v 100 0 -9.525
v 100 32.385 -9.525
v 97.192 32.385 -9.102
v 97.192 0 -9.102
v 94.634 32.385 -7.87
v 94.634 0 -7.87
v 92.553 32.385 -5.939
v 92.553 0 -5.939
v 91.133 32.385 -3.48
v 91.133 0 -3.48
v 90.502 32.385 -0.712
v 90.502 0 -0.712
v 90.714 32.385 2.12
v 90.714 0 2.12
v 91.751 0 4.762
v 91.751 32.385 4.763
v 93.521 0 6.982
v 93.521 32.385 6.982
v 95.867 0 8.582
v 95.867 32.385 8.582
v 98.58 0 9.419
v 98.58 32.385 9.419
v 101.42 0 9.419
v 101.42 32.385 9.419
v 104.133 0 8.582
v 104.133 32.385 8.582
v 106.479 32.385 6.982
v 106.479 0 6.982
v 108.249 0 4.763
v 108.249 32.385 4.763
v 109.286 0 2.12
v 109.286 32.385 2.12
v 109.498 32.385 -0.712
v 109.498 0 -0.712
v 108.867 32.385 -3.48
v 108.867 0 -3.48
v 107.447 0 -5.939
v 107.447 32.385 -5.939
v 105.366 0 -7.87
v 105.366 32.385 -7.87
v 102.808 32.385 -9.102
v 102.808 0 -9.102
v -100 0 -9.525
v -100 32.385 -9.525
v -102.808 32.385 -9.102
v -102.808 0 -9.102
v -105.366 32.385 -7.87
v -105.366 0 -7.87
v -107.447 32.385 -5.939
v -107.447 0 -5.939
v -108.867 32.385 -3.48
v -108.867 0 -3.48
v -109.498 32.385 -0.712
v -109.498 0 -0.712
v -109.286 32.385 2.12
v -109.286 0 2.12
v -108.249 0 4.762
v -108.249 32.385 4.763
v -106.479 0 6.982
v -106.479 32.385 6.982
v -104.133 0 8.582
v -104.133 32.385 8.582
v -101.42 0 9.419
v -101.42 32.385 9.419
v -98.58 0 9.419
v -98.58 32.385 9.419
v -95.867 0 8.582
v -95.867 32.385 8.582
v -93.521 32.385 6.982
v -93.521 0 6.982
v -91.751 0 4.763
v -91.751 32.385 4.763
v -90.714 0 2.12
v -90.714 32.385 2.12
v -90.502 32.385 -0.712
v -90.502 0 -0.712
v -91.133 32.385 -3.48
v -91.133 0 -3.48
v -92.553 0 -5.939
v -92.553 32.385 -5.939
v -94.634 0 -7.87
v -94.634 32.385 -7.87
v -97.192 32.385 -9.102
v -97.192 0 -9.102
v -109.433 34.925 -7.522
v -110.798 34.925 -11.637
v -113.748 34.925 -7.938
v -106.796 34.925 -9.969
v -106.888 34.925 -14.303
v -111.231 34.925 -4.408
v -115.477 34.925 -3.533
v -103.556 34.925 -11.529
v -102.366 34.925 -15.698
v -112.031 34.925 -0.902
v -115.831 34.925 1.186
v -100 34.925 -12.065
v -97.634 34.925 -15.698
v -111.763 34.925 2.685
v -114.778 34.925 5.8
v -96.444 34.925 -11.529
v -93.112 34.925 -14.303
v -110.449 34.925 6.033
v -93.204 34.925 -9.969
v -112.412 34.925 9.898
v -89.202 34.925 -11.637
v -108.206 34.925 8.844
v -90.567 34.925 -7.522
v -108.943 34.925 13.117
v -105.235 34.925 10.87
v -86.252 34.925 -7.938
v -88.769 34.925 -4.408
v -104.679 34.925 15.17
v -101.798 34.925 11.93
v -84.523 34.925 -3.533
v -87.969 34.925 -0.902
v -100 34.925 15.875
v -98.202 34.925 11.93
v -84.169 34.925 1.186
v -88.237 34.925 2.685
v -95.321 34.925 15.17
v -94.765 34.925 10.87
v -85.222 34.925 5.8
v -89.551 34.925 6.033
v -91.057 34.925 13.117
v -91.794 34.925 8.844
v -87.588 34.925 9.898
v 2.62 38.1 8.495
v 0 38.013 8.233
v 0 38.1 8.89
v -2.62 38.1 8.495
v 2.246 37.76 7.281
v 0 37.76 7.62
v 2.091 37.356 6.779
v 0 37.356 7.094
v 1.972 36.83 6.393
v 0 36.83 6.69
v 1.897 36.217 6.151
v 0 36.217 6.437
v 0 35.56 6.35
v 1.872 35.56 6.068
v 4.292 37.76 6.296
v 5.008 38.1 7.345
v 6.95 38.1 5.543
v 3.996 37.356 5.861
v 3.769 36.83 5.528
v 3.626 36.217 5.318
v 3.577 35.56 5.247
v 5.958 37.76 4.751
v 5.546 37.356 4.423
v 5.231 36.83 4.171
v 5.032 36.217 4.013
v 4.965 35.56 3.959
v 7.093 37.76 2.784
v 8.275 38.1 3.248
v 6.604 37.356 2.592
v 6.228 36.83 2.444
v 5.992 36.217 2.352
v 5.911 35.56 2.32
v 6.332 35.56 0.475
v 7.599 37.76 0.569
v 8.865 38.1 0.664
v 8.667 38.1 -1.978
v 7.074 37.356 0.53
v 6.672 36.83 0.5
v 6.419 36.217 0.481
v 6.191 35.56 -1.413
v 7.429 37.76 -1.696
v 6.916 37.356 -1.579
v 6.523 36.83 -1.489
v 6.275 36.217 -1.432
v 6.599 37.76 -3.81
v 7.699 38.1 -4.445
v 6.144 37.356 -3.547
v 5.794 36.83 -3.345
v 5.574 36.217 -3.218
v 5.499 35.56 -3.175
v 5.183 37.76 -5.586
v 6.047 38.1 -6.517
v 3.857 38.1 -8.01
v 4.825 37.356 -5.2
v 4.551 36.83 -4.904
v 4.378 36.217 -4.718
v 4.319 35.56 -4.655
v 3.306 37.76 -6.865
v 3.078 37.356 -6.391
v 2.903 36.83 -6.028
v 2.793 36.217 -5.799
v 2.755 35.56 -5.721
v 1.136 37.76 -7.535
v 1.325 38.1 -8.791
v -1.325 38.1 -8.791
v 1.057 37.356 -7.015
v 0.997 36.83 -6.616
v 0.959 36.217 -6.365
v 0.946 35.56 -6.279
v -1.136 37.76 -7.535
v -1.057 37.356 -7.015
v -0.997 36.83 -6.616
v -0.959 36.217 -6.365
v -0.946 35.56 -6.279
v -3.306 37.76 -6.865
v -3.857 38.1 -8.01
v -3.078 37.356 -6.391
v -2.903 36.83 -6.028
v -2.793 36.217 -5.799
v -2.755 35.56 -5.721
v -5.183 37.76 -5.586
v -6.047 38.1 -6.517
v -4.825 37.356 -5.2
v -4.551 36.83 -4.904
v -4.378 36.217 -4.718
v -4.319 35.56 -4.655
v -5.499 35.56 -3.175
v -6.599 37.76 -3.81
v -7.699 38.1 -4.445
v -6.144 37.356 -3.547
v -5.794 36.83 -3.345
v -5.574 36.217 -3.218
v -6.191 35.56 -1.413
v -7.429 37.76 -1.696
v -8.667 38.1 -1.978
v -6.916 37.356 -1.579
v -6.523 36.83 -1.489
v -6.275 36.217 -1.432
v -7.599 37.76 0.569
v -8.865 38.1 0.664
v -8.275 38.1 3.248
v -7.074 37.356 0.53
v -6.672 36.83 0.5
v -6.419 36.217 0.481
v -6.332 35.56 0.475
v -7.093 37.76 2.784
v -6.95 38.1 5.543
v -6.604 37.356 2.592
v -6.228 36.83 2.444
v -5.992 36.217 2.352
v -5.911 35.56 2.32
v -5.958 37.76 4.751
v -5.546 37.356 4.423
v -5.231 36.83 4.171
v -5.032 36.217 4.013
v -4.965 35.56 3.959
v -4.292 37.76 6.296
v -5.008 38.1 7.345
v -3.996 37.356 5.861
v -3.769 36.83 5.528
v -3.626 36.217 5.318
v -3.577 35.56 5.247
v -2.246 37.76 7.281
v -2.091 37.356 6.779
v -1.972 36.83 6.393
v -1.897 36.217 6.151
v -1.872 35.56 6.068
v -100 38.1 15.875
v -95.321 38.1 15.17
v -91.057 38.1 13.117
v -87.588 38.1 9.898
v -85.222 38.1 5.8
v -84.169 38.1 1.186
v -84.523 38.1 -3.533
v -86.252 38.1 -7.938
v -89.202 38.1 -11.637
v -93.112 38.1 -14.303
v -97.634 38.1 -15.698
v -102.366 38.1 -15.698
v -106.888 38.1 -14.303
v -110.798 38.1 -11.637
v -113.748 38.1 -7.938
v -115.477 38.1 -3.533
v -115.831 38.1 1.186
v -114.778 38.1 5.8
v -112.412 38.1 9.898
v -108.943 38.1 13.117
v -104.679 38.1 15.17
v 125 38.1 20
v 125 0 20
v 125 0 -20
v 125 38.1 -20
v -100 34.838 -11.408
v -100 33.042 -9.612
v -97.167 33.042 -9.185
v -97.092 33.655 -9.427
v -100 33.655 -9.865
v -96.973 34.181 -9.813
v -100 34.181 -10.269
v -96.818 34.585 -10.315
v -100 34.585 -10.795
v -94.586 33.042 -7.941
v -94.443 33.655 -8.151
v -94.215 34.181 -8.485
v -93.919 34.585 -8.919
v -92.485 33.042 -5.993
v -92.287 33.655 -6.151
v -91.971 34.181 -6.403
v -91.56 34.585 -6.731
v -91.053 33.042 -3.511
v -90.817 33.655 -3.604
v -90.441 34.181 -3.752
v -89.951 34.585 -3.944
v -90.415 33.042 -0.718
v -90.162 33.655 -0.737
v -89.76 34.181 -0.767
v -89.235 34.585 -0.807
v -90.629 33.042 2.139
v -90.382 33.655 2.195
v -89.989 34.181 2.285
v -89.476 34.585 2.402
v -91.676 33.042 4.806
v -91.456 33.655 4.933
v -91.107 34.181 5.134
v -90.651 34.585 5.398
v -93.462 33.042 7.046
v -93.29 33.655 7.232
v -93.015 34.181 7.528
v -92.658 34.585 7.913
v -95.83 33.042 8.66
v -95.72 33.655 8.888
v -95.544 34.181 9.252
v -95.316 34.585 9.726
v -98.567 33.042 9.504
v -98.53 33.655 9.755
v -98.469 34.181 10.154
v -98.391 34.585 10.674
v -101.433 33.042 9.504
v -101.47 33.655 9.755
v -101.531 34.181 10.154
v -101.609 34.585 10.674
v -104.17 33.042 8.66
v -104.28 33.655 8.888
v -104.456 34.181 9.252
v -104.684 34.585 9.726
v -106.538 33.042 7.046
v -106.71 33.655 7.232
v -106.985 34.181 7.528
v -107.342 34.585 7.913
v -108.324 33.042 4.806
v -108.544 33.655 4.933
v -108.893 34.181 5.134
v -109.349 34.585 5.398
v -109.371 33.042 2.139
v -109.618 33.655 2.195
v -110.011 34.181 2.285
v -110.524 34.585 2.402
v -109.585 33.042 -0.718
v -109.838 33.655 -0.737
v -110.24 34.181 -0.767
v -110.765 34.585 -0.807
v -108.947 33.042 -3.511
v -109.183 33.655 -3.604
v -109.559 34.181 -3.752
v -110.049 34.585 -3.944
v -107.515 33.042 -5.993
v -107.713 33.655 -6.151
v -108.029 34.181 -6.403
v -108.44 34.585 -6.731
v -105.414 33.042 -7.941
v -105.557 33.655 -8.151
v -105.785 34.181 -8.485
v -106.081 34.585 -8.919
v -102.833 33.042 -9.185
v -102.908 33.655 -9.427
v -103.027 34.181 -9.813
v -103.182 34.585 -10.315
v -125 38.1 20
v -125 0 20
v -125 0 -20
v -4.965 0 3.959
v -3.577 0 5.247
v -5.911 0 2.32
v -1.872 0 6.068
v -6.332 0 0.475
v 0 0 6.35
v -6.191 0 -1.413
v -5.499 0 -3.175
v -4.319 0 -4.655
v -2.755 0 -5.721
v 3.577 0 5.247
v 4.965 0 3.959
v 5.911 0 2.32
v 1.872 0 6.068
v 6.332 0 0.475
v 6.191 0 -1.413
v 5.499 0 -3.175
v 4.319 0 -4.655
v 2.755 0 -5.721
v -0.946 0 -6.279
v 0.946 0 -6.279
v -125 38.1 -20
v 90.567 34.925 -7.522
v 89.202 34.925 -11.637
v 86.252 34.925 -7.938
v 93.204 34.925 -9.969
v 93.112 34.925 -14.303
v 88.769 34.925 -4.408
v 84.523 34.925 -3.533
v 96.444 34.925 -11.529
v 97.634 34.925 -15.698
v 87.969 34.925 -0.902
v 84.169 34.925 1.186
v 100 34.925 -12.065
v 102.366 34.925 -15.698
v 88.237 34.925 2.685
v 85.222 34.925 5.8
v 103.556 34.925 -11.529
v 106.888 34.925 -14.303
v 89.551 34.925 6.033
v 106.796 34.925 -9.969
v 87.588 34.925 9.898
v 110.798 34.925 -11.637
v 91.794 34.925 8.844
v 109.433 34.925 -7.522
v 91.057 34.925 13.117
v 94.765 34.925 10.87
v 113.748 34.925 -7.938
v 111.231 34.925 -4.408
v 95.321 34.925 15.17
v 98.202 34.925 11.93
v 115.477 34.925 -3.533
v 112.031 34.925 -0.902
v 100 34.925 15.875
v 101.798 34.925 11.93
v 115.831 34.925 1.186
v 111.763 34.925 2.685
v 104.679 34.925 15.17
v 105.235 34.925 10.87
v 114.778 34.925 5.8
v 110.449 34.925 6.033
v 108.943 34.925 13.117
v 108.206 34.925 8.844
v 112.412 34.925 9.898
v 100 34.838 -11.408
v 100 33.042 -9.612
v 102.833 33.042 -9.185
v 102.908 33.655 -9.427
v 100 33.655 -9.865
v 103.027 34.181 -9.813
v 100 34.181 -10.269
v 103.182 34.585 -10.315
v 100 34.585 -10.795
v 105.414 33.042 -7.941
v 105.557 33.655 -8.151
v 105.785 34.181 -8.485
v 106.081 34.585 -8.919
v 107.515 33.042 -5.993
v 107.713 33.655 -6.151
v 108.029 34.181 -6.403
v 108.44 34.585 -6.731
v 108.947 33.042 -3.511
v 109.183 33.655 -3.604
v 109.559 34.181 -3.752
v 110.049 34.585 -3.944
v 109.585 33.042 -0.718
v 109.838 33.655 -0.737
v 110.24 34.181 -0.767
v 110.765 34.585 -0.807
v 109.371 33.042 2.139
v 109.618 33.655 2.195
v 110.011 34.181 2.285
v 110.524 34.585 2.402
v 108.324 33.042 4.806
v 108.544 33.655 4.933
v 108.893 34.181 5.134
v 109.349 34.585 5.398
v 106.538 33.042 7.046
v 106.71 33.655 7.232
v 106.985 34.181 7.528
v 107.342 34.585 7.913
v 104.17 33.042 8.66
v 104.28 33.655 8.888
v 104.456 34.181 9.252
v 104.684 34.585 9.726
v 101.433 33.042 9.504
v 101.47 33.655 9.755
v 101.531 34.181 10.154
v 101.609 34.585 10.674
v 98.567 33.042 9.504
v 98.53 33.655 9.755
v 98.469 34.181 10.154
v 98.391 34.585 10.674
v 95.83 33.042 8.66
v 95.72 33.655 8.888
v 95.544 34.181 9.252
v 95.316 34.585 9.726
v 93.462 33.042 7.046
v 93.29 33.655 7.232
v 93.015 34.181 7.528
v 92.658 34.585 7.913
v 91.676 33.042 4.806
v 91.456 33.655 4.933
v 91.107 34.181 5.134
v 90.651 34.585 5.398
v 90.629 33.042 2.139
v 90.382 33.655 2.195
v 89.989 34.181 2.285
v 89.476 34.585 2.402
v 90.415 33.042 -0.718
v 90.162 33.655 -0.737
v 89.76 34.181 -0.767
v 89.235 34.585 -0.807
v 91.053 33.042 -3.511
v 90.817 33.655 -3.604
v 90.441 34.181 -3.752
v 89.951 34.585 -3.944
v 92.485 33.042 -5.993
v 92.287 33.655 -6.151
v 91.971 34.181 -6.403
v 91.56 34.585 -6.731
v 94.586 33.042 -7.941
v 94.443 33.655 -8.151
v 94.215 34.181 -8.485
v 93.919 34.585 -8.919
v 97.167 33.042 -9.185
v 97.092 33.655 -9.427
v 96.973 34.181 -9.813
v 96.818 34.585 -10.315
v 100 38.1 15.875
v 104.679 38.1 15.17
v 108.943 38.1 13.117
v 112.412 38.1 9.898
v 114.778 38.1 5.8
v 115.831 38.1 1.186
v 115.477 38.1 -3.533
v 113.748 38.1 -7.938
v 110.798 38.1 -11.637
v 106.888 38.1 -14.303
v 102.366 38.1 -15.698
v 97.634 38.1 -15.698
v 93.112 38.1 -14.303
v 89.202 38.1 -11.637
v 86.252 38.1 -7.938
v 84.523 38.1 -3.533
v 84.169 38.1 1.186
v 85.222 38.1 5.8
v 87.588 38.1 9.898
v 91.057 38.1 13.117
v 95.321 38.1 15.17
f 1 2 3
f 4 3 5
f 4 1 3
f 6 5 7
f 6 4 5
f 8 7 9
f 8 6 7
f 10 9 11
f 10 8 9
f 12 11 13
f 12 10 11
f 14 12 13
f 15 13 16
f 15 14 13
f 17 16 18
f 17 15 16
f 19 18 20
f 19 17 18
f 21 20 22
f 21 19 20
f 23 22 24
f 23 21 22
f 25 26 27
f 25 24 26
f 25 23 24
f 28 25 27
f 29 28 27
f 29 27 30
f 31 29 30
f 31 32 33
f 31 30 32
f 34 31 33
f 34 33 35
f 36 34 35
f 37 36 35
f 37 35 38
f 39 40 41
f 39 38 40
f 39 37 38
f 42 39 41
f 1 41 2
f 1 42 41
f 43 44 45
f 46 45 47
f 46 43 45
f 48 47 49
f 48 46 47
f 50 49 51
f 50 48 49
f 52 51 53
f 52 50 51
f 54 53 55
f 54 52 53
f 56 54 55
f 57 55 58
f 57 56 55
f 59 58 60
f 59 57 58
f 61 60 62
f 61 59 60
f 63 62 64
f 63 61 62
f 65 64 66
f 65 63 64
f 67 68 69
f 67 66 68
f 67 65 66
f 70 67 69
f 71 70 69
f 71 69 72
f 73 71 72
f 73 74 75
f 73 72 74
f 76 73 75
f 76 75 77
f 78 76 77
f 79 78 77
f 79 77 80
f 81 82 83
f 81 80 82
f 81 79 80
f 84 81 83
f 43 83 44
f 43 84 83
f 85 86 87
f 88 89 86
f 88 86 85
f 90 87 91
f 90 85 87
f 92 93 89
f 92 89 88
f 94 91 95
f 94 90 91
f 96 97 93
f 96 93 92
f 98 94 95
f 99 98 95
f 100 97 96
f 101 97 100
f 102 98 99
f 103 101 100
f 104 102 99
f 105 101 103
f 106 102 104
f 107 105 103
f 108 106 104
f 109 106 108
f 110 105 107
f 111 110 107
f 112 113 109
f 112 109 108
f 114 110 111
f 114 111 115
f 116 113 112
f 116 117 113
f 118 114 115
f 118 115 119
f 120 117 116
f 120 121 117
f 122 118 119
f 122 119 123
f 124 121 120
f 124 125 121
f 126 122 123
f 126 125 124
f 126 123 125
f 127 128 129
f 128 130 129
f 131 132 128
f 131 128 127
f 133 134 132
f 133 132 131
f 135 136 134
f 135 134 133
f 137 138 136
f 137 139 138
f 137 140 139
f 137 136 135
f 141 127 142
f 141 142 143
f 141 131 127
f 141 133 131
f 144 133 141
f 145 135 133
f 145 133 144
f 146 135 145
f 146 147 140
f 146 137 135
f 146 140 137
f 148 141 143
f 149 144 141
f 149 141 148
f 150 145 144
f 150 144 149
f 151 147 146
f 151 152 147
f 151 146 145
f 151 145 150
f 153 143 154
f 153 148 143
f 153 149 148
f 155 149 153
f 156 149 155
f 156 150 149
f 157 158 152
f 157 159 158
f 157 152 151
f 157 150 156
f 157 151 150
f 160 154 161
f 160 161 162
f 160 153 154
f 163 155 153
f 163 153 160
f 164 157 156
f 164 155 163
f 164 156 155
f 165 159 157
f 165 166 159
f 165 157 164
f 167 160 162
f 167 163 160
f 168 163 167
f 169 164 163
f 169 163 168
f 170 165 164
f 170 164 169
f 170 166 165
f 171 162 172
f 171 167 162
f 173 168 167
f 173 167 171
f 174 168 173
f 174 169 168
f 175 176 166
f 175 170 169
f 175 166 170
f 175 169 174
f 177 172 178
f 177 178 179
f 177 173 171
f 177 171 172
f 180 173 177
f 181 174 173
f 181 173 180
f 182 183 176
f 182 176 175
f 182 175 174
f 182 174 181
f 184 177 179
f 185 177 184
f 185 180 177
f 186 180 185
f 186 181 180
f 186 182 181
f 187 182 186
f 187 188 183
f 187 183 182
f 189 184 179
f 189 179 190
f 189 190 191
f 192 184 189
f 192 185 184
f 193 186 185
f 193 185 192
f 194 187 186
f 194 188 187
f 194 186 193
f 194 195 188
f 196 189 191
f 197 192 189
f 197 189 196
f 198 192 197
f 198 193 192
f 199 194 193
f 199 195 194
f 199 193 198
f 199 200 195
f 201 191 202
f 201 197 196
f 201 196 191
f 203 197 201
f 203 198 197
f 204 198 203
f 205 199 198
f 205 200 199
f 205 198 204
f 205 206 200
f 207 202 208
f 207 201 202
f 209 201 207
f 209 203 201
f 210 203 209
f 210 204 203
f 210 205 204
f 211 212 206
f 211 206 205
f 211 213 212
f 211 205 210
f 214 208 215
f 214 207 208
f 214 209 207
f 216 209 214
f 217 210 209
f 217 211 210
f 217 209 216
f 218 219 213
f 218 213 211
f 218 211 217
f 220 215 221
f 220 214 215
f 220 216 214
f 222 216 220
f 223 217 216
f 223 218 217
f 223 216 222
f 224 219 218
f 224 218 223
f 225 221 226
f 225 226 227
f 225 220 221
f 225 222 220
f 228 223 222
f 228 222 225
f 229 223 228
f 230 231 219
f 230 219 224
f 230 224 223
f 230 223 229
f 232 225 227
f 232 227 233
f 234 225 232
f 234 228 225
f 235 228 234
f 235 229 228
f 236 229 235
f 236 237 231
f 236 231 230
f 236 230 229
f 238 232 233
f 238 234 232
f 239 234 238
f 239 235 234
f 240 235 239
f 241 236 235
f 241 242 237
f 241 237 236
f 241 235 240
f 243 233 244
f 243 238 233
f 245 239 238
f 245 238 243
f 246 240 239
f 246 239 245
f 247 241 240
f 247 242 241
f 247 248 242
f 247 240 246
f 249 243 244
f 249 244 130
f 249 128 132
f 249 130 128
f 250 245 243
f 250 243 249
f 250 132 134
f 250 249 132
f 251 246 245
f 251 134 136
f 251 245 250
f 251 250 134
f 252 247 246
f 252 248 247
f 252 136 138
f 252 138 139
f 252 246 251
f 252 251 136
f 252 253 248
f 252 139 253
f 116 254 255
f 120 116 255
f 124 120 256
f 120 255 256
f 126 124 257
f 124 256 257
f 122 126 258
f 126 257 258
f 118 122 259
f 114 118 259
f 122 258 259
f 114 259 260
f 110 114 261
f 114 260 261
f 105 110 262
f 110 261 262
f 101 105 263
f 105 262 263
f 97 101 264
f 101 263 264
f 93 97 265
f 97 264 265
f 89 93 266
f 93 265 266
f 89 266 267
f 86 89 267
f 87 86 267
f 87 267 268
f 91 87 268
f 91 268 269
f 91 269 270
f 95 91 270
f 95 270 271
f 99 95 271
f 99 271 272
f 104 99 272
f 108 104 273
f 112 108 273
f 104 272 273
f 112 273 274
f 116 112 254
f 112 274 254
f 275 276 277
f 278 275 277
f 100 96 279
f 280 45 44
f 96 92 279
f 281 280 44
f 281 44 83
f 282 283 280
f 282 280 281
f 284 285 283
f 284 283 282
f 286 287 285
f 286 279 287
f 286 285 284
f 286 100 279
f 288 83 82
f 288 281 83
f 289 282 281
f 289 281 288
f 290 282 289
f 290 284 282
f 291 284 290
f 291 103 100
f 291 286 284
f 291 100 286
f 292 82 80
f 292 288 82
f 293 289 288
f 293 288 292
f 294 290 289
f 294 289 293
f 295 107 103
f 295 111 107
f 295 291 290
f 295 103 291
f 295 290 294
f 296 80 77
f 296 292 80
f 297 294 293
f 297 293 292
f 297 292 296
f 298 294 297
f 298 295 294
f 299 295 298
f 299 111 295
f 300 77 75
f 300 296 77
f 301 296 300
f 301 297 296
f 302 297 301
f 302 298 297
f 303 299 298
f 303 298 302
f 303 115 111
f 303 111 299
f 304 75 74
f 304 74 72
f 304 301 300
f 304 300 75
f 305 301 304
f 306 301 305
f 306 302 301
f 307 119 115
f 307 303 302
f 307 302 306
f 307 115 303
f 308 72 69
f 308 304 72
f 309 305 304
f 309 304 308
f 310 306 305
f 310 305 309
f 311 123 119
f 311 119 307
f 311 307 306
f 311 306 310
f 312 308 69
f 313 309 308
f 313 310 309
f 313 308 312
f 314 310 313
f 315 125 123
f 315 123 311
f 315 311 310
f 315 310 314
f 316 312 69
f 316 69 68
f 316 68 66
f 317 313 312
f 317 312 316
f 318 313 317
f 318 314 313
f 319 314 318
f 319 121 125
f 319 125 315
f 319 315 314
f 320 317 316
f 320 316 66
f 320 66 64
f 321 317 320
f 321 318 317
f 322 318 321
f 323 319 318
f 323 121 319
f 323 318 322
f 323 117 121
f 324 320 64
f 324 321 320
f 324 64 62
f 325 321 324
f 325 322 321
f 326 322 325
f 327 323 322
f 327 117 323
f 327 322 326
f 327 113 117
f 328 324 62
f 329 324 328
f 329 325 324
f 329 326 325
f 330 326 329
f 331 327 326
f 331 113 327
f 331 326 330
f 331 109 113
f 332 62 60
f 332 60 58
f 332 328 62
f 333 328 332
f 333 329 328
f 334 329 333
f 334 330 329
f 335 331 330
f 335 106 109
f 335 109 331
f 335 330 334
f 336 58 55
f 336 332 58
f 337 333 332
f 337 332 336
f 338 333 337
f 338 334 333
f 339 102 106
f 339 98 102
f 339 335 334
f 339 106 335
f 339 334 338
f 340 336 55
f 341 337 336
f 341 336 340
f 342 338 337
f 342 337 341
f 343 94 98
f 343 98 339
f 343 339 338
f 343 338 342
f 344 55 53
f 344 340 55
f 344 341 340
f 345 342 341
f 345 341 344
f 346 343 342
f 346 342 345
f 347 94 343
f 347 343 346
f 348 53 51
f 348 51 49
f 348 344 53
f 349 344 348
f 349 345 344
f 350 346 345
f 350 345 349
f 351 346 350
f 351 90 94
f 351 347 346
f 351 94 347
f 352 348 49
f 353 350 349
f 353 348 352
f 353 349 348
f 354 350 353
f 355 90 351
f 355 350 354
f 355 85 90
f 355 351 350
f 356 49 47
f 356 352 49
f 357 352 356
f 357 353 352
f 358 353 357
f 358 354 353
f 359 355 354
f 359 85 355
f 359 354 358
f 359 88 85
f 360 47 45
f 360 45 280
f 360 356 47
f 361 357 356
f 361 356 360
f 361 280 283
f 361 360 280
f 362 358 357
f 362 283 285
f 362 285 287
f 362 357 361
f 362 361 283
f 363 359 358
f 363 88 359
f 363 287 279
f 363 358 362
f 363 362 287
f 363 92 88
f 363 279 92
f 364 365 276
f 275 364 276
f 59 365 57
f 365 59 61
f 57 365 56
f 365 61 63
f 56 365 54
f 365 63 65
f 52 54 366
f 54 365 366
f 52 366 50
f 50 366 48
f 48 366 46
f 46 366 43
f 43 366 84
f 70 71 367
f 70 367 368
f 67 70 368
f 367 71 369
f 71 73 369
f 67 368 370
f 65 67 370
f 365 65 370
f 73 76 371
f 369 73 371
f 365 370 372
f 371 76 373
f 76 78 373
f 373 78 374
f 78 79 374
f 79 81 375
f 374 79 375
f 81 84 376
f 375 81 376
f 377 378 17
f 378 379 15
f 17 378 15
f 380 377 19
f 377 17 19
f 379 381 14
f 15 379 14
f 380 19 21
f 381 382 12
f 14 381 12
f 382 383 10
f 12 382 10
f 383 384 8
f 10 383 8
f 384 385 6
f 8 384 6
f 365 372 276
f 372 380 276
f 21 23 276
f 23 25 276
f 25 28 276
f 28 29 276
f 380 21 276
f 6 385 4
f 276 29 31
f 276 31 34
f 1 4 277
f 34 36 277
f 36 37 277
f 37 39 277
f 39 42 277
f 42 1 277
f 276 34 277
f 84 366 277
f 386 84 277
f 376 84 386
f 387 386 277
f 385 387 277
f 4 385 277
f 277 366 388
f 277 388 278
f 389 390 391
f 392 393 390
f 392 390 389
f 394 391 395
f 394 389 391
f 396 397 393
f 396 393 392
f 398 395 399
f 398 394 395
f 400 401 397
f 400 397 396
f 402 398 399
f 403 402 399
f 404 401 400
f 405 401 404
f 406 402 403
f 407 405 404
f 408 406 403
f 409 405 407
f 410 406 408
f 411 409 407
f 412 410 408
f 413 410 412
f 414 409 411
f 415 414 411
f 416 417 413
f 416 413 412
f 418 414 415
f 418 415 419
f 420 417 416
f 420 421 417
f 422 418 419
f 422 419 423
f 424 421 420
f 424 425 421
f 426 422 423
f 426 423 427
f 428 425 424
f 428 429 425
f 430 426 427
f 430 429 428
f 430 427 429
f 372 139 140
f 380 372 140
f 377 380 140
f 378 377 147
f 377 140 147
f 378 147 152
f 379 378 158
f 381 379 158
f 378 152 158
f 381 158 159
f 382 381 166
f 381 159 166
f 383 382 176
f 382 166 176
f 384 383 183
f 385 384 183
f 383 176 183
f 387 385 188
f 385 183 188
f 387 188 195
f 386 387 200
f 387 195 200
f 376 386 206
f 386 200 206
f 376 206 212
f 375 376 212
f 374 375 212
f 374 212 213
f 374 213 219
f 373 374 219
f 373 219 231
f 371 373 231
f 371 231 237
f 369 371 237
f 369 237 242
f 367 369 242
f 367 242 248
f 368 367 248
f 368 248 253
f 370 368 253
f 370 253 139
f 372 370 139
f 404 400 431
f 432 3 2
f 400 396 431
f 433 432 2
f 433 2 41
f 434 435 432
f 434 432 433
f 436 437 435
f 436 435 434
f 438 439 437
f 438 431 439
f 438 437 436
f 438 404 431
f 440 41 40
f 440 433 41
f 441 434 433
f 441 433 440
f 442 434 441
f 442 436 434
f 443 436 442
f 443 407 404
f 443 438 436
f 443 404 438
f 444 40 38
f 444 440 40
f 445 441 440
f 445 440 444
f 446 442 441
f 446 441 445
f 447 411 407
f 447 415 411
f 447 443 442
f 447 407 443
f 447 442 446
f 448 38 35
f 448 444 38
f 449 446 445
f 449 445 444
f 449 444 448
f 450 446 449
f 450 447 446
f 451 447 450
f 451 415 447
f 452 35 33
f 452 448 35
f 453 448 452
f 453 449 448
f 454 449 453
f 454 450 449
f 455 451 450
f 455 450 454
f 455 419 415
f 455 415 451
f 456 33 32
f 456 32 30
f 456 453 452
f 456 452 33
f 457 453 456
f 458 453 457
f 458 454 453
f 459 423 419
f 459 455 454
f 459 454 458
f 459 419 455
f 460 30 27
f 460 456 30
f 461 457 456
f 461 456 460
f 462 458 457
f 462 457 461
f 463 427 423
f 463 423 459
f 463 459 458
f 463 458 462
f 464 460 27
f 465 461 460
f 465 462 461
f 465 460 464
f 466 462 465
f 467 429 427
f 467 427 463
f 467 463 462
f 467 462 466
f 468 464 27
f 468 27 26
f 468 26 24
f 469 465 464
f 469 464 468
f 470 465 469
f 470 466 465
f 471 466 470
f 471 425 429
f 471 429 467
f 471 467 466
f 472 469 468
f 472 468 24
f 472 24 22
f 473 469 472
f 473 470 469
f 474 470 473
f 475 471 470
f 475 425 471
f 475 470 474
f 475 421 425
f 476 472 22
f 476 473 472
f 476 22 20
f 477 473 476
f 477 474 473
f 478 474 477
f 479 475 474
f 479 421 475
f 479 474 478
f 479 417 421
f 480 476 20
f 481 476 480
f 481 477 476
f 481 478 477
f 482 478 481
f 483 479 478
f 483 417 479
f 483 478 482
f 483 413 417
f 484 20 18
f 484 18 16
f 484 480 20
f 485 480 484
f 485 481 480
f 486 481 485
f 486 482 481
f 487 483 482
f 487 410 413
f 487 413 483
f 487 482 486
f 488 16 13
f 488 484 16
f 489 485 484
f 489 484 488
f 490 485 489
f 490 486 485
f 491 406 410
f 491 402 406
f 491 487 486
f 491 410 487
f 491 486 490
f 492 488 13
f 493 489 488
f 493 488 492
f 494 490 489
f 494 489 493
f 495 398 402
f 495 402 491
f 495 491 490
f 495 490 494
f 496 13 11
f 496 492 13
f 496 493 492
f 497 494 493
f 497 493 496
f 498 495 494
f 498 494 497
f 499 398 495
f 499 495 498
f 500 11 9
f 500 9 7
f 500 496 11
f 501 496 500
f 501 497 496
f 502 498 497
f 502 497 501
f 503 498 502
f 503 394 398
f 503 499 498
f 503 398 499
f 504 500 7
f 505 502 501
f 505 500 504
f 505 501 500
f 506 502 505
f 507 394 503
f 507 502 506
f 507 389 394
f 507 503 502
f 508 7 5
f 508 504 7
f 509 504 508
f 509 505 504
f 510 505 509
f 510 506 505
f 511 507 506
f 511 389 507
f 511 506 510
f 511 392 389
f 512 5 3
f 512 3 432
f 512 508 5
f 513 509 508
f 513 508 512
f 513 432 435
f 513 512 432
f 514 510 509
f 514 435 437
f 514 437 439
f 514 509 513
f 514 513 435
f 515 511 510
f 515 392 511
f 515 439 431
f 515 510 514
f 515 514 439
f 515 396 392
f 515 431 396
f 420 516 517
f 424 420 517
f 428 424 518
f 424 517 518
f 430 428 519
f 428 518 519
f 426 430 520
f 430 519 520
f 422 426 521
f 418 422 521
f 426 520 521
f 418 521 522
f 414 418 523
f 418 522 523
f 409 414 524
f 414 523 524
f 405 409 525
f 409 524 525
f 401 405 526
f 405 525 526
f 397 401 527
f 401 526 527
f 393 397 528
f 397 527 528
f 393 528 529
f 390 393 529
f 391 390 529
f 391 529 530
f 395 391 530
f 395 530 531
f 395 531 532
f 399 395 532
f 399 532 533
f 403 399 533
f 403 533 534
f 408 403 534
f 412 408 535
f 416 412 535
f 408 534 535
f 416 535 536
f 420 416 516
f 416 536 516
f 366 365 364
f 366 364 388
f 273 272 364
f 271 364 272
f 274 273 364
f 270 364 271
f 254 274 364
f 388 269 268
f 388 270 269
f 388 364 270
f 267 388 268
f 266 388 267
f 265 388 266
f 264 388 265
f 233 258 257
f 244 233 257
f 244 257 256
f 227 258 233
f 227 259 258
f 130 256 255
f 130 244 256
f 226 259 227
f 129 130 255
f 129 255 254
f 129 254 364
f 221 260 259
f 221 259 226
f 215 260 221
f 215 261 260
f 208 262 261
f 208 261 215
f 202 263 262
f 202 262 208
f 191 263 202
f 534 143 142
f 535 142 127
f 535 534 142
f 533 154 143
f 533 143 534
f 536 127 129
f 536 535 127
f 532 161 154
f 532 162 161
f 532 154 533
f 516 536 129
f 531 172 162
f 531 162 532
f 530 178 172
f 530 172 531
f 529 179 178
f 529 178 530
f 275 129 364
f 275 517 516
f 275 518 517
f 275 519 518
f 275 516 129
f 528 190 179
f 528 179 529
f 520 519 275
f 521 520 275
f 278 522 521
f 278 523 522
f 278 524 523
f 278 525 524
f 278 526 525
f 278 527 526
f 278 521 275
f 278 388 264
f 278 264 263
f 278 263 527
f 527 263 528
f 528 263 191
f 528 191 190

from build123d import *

# Parameters (mm, degrees)
SKETCH1_W           = 250
SKETCH1_H           = 40
SKETCH1_R           = 9.525
BOSS_EXTRUDE1_DEPTH = 38.1
SKETCH3_R           = 15.875
CUT_EXTRUDE1_DEPTH  = 3.175
SKETCH4_R           = 6.35
CUT_EXTRUDE2_DEPTH  = 133.199130103
FILLET1_R           = 2.54


with BuildPart() as part:
    # Sketch1 → Boss-Extrude1 (new body)
    with BuildSketch(Plane(origin=(0, 0, 0), x_dir=(1, 0, 0), z_dir=(0, 1, 0))):
        Rectangle(SKETCH1_W, SKETCH1_H)
        with Locations(Location((-100, 0, 0), (0, 0, 90))):
            Circle(SKETCH1_R, mode=Mode.SUBTRACT)
        with Locations(Location((100, 0, 0), (0, 0, 90))):
            Circle(SKETCH1_R, mode=Mode.SUBTRACT)
    extrude(amount=BOSS_EXTRUDE1_DEPTH)

    # Sketch3 → Cut-Extrude1 (cut)
    with BuildSketch(Plane(origin=(0, 38.1, 0), x_dir=(1, 0, 0), z_dir=(0, 1, 0))):
        with Locations(Location((-100, 0, 0), (0, 0, 270))):
            Circle(SKETCH3_R)
        with Locations(Location((100, 0, 0), (0, 0, 270))):
            Circle(SKETCH3_R)
    extrude(amount=-CUT_EXTRUDE1_DEPTH, mode=Mode.SUBTRACT)

    # Sketch4 → Cut-Extrude2 (cut, through all)
    with BuildSketch(Plane(origin=(0, 38.1, 0), x_dir=(1, 0, 0), z_dir=(0, 1, 0))):
        with Locations(Location((0, 0, 0), (0, 0, 270))):
            Circle(SKETCH4_R)
    extrude(amount=-CUT_EXTRUDE2_DEPTH, mode=Mode.SUBTRACT)

    # Fillet1
    fillet1_edges = [part.edges().sort_by_distance(p)[0] for p in [
        (-100, 34.925, 9.525),
        (100, 34.925, 9.525),
        (0, 38.1, -6.35),
    ]]
    fillet(fillet1_edges, radius=FILLET1_R)


solid = part.part
